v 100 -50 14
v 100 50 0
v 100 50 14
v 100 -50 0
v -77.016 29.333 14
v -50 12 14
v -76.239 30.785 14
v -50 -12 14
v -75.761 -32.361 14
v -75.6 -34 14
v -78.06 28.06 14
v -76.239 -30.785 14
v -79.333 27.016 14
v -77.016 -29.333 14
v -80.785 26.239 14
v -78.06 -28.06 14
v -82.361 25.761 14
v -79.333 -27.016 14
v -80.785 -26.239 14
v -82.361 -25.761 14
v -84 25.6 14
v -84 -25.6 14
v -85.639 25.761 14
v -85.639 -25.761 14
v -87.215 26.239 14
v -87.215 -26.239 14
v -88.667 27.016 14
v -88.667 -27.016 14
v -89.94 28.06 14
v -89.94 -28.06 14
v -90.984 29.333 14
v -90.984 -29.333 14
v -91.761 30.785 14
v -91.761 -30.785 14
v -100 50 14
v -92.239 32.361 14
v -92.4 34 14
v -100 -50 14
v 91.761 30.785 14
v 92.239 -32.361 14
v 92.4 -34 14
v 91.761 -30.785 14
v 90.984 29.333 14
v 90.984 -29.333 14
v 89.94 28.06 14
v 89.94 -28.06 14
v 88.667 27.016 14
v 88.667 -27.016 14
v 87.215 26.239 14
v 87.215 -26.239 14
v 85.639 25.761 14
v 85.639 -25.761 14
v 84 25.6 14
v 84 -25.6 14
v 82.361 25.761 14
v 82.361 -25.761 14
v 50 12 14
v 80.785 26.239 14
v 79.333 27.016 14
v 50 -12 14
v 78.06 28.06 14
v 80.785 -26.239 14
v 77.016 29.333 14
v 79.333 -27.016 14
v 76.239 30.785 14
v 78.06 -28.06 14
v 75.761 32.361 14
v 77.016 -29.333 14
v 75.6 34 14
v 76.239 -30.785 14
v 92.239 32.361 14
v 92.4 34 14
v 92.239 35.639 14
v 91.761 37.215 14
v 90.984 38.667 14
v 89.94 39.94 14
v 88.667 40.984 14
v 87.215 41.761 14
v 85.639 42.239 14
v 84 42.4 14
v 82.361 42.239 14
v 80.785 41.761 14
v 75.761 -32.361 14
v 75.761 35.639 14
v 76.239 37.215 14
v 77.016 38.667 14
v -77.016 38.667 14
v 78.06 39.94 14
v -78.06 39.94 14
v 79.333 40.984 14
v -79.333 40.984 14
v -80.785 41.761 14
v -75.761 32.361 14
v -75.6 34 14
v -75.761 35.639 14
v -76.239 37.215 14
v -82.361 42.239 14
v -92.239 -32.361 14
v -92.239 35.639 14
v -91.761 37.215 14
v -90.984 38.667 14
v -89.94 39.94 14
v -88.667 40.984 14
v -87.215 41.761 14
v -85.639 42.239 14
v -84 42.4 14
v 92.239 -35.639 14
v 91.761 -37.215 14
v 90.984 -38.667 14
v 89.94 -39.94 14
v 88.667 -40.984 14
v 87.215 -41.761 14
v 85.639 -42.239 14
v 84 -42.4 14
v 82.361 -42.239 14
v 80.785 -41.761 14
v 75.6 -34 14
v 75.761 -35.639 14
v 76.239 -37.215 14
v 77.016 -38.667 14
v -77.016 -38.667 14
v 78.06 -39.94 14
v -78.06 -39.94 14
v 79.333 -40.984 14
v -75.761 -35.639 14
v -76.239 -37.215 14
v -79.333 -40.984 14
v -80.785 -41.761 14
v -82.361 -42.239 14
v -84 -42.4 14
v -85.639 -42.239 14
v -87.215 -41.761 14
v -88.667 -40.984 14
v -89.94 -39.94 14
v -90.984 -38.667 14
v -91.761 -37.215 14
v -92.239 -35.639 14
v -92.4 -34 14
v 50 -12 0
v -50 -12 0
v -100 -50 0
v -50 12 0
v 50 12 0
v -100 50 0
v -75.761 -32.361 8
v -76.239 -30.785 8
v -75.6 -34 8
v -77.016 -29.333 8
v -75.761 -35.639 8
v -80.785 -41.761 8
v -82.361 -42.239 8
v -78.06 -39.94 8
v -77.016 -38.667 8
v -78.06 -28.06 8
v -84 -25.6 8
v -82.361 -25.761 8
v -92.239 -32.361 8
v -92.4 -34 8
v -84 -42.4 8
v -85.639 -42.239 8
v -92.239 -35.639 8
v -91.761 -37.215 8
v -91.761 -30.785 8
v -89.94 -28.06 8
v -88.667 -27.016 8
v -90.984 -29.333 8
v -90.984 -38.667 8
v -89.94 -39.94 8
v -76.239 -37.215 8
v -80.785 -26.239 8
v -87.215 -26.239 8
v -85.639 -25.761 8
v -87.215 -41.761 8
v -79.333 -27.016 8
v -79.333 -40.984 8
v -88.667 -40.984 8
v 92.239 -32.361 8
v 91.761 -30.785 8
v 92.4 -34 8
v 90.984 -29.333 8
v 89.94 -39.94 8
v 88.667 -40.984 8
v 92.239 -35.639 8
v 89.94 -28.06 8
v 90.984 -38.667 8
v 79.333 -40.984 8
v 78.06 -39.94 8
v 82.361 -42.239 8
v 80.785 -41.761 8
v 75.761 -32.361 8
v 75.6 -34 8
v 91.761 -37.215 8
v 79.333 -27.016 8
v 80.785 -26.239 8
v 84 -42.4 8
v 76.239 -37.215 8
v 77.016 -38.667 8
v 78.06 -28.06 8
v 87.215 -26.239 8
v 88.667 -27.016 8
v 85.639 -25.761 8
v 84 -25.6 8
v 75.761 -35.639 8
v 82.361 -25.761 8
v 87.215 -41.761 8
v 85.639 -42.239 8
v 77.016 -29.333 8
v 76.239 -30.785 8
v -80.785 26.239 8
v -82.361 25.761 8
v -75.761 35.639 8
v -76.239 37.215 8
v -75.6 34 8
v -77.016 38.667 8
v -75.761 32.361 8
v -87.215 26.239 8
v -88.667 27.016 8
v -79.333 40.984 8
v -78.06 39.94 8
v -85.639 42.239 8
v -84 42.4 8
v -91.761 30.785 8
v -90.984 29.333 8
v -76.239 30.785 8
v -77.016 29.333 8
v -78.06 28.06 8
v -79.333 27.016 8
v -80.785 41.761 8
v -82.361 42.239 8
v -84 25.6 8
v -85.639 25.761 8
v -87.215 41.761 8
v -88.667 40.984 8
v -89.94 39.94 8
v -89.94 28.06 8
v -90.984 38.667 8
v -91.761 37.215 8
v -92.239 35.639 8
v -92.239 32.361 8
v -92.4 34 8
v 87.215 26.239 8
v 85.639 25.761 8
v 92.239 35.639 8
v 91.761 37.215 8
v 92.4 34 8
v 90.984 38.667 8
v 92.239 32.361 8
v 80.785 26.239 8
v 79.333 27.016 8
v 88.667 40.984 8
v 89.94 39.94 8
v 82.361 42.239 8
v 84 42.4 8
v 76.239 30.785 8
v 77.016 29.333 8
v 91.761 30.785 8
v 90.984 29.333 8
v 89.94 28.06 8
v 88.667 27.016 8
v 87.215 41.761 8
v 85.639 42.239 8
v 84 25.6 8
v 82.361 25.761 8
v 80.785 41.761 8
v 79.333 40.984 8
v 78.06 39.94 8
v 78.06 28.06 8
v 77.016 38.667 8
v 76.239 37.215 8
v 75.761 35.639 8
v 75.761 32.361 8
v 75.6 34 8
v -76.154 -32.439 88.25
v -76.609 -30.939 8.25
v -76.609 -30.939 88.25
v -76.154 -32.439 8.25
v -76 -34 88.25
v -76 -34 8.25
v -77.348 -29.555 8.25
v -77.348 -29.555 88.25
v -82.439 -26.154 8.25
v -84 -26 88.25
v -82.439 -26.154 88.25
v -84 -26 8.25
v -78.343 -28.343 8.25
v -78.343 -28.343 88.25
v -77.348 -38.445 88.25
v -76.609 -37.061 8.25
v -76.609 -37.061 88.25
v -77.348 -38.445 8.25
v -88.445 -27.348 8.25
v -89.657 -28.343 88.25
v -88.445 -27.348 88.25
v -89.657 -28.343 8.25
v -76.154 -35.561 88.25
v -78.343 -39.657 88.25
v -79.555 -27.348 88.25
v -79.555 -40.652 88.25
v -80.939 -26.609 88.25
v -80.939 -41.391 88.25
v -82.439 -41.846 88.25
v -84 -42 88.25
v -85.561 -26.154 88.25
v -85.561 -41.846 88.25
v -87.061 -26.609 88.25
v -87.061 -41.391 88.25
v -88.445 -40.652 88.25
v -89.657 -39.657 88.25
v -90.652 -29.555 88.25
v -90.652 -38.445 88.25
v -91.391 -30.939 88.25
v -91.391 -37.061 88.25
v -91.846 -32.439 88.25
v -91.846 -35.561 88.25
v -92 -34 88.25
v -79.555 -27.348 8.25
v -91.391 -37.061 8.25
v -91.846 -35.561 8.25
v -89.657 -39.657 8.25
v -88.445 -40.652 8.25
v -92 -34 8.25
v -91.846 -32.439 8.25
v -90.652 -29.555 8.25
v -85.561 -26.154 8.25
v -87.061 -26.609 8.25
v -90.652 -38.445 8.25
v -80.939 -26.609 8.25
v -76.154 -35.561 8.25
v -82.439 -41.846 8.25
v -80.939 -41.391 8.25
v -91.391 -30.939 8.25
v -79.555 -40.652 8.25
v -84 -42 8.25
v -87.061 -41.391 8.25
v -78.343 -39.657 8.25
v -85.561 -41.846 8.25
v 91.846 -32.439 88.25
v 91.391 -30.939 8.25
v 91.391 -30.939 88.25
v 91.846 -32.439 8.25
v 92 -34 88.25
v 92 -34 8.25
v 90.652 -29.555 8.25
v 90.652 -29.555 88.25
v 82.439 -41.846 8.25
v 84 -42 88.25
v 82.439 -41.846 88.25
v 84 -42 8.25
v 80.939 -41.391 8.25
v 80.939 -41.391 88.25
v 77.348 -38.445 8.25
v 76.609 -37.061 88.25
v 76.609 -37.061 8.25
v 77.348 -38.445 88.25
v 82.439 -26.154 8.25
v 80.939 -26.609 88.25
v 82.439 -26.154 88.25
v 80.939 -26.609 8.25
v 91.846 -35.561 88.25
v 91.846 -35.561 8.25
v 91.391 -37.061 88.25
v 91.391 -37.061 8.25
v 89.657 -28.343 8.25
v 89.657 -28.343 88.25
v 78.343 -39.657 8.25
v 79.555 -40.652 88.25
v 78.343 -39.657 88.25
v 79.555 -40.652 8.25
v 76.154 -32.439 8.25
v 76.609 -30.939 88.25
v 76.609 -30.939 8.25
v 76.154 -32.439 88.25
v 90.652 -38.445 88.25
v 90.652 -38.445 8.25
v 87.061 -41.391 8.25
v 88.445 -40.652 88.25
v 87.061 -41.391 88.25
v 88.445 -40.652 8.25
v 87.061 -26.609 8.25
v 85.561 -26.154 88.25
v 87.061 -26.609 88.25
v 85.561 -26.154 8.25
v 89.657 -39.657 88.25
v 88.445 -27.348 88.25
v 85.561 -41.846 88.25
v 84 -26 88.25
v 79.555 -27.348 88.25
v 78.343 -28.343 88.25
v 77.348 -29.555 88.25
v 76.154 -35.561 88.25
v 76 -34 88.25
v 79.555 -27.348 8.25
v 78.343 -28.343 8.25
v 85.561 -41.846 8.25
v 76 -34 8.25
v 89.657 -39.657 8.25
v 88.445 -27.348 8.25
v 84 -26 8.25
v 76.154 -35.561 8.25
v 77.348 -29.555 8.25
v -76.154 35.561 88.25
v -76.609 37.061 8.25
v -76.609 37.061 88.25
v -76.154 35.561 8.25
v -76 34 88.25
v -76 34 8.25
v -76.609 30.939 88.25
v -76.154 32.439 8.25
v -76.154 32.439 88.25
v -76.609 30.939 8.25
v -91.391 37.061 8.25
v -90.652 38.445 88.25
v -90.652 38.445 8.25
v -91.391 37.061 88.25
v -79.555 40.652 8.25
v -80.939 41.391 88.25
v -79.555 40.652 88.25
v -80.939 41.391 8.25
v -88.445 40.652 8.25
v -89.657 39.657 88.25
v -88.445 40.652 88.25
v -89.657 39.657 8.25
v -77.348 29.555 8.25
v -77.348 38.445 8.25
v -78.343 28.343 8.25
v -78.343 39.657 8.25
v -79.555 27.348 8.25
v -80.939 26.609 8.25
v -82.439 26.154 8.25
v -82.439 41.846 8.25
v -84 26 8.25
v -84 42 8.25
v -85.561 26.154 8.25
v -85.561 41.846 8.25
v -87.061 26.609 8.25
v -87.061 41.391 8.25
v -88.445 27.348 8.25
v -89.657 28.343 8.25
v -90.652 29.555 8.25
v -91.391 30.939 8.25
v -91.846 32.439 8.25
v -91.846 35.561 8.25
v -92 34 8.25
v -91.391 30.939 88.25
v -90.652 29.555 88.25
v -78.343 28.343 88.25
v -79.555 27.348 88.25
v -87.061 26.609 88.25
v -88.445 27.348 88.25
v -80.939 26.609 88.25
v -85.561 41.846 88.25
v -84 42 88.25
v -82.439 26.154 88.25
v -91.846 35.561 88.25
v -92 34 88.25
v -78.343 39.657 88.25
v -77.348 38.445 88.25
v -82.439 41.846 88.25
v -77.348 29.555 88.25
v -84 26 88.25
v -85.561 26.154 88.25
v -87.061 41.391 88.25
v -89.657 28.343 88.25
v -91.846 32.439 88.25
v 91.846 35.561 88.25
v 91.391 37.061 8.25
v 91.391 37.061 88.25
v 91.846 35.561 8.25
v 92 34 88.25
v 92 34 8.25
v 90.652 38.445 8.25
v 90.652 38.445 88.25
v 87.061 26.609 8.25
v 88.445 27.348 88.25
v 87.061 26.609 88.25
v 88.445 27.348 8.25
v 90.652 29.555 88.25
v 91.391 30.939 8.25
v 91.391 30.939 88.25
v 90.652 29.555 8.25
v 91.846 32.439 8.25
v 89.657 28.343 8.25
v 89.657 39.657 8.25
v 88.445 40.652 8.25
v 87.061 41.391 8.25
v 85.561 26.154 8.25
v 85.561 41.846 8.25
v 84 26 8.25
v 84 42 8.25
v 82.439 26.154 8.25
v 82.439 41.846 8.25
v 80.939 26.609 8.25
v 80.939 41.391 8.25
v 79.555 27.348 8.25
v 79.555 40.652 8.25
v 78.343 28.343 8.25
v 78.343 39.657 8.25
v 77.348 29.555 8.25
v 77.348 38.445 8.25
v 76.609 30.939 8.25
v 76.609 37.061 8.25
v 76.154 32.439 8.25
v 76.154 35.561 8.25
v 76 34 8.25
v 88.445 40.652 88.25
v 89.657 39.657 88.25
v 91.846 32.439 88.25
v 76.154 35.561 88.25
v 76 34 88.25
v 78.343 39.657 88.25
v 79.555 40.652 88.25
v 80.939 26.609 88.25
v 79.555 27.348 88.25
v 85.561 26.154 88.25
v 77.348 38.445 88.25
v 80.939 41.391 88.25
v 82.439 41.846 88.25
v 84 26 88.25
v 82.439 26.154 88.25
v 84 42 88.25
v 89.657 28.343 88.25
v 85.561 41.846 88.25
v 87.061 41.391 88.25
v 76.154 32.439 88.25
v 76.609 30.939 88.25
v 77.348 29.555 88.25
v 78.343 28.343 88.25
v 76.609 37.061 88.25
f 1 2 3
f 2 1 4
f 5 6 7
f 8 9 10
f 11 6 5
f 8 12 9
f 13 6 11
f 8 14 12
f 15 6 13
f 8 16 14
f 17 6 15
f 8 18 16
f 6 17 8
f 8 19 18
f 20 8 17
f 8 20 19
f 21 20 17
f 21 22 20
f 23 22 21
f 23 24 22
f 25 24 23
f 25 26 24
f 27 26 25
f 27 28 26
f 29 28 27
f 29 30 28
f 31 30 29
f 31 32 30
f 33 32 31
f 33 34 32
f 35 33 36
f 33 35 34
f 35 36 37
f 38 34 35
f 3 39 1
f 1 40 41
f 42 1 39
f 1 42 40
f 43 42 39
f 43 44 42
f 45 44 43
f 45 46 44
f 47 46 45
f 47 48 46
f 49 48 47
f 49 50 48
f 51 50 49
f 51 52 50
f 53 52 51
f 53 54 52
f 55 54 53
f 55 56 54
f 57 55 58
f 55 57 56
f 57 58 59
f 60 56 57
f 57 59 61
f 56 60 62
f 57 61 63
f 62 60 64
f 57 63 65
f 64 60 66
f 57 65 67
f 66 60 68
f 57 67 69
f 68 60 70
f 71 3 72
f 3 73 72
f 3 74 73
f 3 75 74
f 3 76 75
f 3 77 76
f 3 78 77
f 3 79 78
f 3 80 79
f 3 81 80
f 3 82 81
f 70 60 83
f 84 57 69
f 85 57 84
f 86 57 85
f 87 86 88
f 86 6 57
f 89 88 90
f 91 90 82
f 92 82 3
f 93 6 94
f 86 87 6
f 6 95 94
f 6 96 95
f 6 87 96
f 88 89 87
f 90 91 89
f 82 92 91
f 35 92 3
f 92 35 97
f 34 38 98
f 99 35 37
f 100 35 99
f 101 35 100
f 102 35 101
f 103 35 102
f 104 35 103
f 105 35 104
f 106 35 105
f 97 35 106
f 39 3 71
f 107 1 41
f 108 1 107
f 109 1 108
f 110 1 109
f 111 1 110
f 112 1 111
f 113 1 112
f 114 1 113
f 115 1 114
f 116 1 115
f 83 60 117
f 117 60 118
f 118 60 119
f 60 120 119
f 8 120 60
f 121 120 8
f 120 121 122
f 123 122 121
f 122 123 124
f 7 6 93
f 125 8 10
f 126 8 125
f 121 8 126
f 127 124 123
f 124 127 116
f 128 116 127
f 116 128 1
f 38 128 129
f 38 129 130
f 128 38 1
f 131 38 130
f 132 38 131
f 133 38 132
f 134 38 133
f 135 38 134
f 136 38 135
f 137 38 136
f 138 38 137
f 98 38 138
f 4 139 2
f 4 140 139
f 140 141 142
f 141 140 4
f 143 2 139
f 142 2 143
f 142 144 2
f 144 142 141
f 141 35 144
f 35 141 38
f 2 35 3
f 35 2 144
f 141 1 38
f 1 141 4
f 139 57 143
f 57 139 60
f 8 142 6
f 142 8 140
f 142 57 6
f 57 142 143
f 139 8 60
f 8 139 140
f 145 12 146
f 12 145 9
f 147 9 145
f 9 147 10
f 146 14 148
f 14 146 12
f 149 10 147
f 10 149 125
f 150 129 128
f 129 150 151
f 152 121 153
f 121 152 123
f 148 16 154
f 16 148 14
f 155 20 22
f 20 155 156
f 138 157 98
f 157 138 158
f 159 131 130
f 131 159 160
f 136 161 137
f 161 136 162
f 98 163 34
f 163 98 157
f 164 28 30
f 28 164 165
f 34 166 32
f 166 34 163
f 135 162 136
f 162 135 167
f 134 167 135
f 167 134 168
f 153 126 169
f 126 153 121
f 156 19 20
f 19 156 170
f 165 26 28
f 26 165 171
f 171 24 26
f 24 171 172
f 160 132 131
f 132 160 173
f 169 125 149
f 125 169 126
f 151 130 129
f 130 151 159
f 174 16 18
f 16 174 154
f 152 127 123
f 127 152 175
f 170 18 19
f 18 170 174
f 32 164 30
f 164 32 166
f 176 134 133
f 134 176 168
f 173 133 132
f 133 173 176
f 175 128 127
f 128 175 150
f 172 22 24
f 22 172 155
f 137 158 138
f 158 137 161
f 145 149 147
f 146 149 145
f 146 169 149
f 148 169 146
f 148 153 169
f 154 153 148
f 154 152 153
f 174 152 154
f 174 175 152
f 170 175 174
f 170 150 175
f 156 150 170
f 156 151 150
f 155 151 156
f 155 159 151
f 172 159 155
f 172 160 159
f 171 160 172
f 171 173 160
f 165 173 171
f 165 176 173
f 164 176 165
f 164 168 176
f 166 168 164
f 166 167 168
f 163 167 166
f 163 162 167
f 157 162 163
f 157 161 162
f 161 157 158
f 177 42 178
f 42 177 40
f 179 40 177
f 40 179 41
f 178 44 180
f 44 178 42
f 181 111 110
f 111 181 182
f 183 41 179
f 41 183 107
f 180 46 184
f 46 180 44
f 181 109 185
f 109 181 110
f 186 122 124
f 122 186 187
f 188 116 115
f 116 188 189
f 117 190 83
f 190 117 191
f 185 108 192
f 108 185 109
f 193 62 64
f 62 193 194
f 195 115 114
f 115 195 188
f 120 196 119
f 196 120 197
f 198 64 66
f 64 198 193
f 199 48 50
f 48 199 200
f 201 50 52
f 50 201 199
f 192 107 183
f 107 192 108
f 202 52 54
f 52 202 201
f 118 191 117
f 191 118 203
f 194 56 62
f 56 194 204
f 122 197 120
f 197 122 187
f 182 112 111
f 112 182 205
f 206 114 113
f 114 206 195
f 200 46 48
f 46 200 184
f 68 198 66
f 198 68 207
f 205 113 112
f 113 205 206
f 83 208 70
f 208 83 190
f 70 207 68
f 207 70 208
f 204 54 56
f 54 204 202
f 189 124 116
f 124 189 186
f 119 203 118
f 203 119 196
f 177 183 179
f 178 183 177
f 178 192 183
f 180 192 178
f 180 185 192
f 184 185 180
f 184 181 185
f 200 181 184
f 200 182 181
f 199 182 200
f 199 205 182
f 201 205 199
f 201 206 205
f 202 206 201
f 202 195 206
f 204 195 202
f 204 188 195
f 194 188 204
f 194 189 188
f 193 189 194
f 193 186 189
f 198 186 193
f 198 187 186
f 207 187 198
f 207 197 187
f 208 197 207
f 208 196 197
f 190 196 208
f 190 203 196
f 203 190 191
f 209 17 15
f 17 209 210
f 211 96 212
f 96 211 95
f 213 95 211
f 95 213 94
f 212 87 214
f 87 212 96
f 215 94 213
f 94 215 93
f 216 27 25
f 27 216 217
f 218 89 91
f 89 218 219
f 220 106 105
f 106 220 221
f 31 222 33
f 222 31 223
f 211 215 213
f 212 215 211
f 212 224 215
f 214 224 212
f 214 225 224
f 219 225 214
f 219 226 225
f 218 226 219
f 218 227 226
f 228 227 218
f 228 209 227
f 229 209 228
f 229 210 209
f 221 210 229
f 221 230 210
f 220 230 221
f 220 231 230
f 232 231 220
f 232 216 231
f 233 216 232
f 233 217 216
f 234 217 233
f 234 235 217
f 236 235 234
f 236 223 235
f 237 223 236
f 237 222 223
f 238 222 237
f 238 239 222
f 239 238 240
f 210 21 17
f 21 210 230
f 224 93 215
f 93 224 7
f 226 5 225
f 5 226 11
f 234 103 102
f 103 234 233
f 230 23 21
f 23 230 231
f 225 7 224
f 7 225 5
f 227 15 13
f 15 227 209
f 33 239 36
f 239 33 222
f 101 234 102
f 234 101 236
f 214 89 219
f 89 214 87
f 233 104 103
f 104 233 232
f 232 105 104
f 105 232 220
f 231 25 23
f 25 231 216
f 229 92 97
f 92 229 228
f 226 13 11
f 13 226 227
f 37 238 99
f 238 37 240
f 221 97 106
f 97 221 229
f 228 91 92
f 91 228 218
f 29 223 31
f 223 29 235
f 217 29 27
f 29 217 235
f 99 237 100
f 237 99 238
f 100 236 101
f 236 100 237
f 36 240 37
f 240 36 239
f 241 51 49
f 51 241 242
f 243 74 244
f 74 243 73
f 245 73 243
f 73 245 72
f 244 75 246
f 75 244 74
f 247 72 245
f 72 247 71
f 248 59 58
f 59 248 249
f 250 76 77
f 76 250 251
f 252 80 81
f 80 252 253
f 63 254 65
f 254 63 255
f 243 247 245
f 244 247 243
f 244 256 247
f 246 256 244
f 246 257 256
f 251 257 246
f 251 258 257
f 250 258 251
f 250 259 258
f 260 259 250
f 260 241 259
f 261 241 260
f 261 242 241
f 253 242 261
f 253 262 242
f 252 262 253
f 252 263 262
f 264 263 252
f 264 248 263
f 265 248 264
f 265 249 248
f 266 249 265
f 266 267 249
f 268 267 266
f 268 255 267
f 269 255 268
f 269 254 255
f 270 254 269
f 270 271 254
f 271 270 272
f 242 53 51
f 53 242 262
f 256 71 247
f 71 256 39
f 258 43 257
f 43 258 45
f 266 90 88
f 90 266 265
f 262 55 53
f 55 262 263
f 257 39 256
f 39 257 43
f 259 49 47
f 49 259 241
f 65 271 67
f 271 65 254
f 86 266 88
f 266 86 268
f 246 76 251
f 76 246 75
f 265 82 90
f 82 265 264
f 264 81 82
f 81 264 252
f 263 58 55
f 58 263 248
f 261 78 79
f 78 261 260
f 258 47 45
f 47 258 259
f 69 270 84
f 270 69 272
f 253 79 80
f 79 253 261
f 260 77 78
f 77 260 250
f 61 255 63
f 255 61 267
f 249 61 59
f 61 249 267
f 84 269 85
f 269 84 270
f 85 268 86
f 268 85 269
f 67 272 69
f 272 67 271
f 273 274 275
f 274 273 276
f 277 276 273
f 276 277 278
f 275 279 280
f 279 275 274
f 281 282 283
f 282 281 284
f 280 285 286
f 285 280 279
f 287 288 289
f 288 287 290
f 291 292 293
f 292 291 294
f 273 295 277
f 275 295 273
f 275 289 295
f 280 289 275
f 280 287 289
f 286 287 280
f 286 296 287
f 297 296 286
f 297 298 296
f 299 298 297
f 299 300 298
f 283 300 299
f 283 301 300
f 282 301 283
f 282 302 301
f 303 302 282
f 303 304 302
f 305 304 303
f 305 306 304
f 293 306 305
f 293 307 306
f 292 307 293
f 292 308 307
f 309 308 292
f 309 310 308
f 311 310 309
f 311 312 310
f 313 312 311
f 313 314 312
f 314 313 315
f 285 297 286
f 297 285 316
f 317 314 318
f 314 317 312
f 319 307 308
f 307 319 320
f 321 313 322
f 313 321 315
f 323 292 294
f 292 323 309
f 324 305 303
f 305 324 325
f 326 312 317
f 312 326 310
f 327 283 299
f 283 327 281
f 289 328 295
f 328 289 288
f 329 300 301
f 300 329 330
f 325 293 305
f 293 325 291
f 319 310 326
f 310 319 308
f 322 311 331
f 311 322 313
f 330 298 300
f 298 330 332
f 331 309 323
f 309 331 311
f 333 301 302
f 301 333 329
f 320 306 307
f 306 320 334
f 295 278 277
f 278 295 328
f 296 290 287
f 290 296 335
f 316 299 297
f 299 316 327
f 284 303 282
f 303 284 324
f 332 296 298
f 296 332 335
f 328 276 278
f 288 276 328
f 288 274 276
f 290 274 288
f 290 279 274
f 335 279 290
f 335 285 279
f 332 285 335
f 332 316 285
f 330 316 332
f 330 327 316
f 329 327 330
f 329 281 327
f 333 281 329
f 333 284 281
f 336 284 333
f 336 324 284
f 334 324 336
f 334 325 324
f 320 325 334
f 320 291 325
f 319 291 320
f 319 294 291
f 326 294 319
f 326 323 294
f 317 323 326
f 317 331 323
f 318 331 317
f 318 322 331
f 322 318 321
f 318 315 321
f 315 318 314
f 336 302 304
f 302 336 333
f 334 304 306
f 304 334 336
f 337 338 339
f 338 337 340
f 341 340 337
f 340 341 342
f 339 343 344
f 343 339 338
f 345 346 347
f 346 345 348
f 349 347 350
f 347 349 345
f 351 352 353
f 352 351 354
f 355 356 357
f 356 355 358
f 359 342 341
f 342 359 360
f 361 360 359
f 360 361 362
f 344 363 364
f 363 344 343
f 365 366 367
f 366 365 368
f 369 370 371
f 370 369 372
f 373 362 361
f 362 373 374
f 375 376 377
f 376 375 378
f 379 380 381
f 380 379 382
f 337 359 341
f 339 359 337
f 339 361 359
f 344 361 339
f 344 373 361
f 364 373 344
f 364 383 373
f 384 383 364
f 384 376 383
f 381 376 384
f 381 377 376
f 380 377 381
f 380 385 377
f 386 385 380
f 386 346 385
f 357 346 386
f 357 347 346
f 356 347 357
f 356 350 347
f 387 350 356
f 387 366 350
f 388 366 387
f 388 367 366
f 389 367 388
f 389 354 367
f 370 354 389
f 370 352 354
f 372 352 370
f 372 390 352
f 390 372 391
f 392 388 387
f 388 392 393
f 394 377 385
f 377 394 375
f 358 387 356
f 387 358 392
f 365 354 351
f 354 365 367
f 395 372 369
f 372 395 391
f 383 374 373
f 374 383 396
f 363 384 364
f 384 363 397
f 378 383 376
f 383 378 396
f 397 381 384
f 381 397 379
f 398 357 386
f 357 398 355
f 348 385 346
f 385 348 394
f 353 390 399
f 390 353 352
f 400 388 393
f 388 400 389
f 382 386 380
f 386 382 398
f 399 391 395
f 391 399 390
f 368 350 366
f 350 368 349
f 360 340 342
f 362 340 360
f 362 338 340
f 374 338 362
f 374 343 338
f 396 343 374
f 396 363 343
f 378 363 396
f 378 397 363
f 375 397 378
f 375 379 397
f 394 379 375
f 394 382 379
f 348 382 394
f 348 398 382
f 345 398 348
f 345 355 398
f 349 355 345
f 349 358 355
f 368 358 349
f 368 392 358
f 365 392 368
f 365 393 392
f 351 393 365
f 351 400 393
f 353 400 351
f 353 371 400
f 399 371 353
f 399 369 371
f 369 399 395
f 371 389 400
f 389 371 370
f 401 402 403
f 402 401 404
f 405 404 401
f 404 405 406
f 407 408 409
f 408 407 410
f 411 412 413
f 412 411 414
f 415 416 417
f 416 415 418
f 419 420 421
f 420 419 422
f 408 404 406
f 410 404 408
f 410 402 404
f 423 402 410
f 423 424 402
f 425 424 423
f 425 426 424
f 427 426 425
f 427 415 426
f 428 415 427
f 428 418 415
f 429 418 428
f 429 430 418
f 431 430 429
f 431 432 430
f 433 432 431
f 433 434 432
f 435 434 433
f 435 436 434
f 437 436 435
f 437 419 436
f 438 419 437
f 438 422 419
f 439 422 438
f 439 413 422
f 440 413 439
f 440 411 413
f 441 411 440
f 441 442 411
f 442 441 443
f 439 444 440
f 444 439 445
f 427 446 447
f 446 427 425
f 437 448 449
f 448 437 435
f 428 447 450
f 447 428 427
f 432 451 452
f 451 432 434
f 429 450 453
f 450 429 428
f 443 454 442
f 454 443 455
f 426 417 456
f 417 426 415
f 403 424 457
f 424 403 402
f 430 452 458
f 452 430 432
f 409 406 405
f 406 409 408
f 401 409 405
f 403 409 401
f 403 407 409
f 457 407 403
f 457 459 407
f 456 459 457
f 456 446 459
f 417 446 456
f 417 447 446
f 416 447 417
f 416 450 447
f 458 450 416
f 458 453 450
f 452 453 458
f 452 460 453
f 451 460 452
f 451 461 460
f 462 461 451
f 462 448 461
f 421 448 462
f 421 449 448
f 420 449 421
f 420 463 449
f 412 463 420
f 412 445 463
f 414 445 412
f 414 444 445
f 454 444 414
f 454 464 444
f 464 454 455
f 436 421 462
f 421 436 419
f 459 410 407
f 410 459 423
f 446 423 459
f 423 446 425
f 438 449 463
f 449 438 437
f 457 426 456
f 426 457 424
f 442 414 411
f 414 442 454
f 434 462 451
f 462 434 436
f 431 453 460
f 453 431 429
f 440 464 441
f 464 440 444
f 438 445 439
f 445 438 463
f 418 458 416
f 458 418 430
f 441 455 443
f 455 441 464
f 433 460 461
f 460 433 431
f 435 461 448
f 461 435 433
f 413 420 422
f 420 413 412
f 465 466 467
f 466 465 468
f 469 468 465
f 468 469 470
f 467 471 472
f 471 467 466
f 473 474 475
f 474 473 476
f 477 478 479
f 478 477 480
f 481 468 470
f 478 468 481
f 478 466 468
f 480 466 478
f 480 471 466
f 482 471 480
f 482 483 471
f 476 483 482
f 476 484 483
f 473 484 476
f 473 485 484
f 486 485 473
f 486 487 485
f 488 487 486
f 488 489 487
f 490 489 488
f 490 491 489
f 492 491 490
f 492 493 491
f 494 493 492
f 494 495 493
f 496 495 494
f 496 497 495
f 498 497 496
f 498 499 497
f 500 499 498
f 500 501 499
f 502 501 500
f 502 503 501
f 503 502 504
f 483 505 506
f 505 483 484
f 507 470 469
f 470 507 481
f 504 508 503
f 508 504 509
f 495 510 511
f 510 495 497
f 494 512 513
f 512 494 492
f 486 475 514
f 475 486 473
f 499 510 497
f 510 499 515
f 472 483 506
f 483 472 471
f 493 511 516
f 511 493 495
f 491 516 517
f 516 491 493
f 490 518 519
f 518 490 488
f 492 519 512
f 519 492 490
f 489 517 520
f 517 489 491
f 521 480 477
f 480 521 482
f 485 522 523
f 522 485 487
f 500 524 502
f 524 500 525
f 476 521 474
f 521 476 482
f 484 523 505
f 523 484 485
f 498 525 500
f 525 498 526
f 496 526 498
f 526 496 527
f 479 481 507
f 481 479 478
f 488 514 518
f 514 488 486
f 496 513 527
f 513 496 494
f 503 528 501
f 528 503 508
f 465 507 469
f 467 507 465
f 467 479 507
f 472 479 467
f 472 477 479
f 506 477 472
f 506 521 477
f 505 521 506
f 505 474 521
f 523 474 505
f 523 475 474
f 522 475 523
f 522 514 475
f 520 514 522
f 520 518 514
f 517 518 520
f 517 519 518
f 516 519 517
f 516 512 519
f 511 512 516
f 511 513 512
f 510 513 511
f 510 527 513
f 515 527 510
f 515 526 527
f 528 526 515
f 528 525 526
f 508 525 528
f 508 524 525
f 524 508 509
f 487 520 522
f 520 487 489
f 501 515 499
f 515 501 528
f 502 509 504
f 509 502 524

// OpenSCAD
$fn = 32;

// ------------------------------------------------------------------------
// Frame with four posts: 200 x 100 mm frame, four d16 posts
// Every part is its own module, assembly() places them once.
// ------------------------------------------------------------------------

// --- part 1 ---
module base_frame() {
  difference() {
    translate([-100, -50, 0]) cube([200, 100, 14]);
    translate([-50, -12, -1]) cube([100, 24, 16]);
    translate([-84, -34, 8]) cylinder(h = 7, d = 16.8);
    translate([84, -34, 8]) cylinder(h = 7, d = 16.8);
    translate([-84, 34, 8]) cylinder(h = 7, d = 16.8);
    translate([84, 34, 8]) cylinder(h = 7, d = 16.8);
  }
}

// --- part 2 ---
module post1() {
  cylinder(h = 80, d = 16);
}

// --- part 3 ---
module post2() {
  cylinder(h = 80, d = 16);
}

// --- part 4 ---
module post3() {
  cylinder(h = 80, d = 16);
}

// --- part 5 ---
module post4() {
  cylinder(h = 80, d = 16);
}

// --- assembly ---
module assembly() {
  translate([0, 0, 0]) rotate([0, 0, 0]) base_frame();
  translate([-84, -34, 8.25]) rotate([0, 0, 0]) post1();
  translate([84, -34, 8.25]) rotate([0, 0, 0]) post2();
  translate([-84, 34, 8.25]) rotate([0, 0, 0]) post3();
  translate([84, 34, 8.25]) rotate([0, 0, 0]) post4();
}

assembly();
